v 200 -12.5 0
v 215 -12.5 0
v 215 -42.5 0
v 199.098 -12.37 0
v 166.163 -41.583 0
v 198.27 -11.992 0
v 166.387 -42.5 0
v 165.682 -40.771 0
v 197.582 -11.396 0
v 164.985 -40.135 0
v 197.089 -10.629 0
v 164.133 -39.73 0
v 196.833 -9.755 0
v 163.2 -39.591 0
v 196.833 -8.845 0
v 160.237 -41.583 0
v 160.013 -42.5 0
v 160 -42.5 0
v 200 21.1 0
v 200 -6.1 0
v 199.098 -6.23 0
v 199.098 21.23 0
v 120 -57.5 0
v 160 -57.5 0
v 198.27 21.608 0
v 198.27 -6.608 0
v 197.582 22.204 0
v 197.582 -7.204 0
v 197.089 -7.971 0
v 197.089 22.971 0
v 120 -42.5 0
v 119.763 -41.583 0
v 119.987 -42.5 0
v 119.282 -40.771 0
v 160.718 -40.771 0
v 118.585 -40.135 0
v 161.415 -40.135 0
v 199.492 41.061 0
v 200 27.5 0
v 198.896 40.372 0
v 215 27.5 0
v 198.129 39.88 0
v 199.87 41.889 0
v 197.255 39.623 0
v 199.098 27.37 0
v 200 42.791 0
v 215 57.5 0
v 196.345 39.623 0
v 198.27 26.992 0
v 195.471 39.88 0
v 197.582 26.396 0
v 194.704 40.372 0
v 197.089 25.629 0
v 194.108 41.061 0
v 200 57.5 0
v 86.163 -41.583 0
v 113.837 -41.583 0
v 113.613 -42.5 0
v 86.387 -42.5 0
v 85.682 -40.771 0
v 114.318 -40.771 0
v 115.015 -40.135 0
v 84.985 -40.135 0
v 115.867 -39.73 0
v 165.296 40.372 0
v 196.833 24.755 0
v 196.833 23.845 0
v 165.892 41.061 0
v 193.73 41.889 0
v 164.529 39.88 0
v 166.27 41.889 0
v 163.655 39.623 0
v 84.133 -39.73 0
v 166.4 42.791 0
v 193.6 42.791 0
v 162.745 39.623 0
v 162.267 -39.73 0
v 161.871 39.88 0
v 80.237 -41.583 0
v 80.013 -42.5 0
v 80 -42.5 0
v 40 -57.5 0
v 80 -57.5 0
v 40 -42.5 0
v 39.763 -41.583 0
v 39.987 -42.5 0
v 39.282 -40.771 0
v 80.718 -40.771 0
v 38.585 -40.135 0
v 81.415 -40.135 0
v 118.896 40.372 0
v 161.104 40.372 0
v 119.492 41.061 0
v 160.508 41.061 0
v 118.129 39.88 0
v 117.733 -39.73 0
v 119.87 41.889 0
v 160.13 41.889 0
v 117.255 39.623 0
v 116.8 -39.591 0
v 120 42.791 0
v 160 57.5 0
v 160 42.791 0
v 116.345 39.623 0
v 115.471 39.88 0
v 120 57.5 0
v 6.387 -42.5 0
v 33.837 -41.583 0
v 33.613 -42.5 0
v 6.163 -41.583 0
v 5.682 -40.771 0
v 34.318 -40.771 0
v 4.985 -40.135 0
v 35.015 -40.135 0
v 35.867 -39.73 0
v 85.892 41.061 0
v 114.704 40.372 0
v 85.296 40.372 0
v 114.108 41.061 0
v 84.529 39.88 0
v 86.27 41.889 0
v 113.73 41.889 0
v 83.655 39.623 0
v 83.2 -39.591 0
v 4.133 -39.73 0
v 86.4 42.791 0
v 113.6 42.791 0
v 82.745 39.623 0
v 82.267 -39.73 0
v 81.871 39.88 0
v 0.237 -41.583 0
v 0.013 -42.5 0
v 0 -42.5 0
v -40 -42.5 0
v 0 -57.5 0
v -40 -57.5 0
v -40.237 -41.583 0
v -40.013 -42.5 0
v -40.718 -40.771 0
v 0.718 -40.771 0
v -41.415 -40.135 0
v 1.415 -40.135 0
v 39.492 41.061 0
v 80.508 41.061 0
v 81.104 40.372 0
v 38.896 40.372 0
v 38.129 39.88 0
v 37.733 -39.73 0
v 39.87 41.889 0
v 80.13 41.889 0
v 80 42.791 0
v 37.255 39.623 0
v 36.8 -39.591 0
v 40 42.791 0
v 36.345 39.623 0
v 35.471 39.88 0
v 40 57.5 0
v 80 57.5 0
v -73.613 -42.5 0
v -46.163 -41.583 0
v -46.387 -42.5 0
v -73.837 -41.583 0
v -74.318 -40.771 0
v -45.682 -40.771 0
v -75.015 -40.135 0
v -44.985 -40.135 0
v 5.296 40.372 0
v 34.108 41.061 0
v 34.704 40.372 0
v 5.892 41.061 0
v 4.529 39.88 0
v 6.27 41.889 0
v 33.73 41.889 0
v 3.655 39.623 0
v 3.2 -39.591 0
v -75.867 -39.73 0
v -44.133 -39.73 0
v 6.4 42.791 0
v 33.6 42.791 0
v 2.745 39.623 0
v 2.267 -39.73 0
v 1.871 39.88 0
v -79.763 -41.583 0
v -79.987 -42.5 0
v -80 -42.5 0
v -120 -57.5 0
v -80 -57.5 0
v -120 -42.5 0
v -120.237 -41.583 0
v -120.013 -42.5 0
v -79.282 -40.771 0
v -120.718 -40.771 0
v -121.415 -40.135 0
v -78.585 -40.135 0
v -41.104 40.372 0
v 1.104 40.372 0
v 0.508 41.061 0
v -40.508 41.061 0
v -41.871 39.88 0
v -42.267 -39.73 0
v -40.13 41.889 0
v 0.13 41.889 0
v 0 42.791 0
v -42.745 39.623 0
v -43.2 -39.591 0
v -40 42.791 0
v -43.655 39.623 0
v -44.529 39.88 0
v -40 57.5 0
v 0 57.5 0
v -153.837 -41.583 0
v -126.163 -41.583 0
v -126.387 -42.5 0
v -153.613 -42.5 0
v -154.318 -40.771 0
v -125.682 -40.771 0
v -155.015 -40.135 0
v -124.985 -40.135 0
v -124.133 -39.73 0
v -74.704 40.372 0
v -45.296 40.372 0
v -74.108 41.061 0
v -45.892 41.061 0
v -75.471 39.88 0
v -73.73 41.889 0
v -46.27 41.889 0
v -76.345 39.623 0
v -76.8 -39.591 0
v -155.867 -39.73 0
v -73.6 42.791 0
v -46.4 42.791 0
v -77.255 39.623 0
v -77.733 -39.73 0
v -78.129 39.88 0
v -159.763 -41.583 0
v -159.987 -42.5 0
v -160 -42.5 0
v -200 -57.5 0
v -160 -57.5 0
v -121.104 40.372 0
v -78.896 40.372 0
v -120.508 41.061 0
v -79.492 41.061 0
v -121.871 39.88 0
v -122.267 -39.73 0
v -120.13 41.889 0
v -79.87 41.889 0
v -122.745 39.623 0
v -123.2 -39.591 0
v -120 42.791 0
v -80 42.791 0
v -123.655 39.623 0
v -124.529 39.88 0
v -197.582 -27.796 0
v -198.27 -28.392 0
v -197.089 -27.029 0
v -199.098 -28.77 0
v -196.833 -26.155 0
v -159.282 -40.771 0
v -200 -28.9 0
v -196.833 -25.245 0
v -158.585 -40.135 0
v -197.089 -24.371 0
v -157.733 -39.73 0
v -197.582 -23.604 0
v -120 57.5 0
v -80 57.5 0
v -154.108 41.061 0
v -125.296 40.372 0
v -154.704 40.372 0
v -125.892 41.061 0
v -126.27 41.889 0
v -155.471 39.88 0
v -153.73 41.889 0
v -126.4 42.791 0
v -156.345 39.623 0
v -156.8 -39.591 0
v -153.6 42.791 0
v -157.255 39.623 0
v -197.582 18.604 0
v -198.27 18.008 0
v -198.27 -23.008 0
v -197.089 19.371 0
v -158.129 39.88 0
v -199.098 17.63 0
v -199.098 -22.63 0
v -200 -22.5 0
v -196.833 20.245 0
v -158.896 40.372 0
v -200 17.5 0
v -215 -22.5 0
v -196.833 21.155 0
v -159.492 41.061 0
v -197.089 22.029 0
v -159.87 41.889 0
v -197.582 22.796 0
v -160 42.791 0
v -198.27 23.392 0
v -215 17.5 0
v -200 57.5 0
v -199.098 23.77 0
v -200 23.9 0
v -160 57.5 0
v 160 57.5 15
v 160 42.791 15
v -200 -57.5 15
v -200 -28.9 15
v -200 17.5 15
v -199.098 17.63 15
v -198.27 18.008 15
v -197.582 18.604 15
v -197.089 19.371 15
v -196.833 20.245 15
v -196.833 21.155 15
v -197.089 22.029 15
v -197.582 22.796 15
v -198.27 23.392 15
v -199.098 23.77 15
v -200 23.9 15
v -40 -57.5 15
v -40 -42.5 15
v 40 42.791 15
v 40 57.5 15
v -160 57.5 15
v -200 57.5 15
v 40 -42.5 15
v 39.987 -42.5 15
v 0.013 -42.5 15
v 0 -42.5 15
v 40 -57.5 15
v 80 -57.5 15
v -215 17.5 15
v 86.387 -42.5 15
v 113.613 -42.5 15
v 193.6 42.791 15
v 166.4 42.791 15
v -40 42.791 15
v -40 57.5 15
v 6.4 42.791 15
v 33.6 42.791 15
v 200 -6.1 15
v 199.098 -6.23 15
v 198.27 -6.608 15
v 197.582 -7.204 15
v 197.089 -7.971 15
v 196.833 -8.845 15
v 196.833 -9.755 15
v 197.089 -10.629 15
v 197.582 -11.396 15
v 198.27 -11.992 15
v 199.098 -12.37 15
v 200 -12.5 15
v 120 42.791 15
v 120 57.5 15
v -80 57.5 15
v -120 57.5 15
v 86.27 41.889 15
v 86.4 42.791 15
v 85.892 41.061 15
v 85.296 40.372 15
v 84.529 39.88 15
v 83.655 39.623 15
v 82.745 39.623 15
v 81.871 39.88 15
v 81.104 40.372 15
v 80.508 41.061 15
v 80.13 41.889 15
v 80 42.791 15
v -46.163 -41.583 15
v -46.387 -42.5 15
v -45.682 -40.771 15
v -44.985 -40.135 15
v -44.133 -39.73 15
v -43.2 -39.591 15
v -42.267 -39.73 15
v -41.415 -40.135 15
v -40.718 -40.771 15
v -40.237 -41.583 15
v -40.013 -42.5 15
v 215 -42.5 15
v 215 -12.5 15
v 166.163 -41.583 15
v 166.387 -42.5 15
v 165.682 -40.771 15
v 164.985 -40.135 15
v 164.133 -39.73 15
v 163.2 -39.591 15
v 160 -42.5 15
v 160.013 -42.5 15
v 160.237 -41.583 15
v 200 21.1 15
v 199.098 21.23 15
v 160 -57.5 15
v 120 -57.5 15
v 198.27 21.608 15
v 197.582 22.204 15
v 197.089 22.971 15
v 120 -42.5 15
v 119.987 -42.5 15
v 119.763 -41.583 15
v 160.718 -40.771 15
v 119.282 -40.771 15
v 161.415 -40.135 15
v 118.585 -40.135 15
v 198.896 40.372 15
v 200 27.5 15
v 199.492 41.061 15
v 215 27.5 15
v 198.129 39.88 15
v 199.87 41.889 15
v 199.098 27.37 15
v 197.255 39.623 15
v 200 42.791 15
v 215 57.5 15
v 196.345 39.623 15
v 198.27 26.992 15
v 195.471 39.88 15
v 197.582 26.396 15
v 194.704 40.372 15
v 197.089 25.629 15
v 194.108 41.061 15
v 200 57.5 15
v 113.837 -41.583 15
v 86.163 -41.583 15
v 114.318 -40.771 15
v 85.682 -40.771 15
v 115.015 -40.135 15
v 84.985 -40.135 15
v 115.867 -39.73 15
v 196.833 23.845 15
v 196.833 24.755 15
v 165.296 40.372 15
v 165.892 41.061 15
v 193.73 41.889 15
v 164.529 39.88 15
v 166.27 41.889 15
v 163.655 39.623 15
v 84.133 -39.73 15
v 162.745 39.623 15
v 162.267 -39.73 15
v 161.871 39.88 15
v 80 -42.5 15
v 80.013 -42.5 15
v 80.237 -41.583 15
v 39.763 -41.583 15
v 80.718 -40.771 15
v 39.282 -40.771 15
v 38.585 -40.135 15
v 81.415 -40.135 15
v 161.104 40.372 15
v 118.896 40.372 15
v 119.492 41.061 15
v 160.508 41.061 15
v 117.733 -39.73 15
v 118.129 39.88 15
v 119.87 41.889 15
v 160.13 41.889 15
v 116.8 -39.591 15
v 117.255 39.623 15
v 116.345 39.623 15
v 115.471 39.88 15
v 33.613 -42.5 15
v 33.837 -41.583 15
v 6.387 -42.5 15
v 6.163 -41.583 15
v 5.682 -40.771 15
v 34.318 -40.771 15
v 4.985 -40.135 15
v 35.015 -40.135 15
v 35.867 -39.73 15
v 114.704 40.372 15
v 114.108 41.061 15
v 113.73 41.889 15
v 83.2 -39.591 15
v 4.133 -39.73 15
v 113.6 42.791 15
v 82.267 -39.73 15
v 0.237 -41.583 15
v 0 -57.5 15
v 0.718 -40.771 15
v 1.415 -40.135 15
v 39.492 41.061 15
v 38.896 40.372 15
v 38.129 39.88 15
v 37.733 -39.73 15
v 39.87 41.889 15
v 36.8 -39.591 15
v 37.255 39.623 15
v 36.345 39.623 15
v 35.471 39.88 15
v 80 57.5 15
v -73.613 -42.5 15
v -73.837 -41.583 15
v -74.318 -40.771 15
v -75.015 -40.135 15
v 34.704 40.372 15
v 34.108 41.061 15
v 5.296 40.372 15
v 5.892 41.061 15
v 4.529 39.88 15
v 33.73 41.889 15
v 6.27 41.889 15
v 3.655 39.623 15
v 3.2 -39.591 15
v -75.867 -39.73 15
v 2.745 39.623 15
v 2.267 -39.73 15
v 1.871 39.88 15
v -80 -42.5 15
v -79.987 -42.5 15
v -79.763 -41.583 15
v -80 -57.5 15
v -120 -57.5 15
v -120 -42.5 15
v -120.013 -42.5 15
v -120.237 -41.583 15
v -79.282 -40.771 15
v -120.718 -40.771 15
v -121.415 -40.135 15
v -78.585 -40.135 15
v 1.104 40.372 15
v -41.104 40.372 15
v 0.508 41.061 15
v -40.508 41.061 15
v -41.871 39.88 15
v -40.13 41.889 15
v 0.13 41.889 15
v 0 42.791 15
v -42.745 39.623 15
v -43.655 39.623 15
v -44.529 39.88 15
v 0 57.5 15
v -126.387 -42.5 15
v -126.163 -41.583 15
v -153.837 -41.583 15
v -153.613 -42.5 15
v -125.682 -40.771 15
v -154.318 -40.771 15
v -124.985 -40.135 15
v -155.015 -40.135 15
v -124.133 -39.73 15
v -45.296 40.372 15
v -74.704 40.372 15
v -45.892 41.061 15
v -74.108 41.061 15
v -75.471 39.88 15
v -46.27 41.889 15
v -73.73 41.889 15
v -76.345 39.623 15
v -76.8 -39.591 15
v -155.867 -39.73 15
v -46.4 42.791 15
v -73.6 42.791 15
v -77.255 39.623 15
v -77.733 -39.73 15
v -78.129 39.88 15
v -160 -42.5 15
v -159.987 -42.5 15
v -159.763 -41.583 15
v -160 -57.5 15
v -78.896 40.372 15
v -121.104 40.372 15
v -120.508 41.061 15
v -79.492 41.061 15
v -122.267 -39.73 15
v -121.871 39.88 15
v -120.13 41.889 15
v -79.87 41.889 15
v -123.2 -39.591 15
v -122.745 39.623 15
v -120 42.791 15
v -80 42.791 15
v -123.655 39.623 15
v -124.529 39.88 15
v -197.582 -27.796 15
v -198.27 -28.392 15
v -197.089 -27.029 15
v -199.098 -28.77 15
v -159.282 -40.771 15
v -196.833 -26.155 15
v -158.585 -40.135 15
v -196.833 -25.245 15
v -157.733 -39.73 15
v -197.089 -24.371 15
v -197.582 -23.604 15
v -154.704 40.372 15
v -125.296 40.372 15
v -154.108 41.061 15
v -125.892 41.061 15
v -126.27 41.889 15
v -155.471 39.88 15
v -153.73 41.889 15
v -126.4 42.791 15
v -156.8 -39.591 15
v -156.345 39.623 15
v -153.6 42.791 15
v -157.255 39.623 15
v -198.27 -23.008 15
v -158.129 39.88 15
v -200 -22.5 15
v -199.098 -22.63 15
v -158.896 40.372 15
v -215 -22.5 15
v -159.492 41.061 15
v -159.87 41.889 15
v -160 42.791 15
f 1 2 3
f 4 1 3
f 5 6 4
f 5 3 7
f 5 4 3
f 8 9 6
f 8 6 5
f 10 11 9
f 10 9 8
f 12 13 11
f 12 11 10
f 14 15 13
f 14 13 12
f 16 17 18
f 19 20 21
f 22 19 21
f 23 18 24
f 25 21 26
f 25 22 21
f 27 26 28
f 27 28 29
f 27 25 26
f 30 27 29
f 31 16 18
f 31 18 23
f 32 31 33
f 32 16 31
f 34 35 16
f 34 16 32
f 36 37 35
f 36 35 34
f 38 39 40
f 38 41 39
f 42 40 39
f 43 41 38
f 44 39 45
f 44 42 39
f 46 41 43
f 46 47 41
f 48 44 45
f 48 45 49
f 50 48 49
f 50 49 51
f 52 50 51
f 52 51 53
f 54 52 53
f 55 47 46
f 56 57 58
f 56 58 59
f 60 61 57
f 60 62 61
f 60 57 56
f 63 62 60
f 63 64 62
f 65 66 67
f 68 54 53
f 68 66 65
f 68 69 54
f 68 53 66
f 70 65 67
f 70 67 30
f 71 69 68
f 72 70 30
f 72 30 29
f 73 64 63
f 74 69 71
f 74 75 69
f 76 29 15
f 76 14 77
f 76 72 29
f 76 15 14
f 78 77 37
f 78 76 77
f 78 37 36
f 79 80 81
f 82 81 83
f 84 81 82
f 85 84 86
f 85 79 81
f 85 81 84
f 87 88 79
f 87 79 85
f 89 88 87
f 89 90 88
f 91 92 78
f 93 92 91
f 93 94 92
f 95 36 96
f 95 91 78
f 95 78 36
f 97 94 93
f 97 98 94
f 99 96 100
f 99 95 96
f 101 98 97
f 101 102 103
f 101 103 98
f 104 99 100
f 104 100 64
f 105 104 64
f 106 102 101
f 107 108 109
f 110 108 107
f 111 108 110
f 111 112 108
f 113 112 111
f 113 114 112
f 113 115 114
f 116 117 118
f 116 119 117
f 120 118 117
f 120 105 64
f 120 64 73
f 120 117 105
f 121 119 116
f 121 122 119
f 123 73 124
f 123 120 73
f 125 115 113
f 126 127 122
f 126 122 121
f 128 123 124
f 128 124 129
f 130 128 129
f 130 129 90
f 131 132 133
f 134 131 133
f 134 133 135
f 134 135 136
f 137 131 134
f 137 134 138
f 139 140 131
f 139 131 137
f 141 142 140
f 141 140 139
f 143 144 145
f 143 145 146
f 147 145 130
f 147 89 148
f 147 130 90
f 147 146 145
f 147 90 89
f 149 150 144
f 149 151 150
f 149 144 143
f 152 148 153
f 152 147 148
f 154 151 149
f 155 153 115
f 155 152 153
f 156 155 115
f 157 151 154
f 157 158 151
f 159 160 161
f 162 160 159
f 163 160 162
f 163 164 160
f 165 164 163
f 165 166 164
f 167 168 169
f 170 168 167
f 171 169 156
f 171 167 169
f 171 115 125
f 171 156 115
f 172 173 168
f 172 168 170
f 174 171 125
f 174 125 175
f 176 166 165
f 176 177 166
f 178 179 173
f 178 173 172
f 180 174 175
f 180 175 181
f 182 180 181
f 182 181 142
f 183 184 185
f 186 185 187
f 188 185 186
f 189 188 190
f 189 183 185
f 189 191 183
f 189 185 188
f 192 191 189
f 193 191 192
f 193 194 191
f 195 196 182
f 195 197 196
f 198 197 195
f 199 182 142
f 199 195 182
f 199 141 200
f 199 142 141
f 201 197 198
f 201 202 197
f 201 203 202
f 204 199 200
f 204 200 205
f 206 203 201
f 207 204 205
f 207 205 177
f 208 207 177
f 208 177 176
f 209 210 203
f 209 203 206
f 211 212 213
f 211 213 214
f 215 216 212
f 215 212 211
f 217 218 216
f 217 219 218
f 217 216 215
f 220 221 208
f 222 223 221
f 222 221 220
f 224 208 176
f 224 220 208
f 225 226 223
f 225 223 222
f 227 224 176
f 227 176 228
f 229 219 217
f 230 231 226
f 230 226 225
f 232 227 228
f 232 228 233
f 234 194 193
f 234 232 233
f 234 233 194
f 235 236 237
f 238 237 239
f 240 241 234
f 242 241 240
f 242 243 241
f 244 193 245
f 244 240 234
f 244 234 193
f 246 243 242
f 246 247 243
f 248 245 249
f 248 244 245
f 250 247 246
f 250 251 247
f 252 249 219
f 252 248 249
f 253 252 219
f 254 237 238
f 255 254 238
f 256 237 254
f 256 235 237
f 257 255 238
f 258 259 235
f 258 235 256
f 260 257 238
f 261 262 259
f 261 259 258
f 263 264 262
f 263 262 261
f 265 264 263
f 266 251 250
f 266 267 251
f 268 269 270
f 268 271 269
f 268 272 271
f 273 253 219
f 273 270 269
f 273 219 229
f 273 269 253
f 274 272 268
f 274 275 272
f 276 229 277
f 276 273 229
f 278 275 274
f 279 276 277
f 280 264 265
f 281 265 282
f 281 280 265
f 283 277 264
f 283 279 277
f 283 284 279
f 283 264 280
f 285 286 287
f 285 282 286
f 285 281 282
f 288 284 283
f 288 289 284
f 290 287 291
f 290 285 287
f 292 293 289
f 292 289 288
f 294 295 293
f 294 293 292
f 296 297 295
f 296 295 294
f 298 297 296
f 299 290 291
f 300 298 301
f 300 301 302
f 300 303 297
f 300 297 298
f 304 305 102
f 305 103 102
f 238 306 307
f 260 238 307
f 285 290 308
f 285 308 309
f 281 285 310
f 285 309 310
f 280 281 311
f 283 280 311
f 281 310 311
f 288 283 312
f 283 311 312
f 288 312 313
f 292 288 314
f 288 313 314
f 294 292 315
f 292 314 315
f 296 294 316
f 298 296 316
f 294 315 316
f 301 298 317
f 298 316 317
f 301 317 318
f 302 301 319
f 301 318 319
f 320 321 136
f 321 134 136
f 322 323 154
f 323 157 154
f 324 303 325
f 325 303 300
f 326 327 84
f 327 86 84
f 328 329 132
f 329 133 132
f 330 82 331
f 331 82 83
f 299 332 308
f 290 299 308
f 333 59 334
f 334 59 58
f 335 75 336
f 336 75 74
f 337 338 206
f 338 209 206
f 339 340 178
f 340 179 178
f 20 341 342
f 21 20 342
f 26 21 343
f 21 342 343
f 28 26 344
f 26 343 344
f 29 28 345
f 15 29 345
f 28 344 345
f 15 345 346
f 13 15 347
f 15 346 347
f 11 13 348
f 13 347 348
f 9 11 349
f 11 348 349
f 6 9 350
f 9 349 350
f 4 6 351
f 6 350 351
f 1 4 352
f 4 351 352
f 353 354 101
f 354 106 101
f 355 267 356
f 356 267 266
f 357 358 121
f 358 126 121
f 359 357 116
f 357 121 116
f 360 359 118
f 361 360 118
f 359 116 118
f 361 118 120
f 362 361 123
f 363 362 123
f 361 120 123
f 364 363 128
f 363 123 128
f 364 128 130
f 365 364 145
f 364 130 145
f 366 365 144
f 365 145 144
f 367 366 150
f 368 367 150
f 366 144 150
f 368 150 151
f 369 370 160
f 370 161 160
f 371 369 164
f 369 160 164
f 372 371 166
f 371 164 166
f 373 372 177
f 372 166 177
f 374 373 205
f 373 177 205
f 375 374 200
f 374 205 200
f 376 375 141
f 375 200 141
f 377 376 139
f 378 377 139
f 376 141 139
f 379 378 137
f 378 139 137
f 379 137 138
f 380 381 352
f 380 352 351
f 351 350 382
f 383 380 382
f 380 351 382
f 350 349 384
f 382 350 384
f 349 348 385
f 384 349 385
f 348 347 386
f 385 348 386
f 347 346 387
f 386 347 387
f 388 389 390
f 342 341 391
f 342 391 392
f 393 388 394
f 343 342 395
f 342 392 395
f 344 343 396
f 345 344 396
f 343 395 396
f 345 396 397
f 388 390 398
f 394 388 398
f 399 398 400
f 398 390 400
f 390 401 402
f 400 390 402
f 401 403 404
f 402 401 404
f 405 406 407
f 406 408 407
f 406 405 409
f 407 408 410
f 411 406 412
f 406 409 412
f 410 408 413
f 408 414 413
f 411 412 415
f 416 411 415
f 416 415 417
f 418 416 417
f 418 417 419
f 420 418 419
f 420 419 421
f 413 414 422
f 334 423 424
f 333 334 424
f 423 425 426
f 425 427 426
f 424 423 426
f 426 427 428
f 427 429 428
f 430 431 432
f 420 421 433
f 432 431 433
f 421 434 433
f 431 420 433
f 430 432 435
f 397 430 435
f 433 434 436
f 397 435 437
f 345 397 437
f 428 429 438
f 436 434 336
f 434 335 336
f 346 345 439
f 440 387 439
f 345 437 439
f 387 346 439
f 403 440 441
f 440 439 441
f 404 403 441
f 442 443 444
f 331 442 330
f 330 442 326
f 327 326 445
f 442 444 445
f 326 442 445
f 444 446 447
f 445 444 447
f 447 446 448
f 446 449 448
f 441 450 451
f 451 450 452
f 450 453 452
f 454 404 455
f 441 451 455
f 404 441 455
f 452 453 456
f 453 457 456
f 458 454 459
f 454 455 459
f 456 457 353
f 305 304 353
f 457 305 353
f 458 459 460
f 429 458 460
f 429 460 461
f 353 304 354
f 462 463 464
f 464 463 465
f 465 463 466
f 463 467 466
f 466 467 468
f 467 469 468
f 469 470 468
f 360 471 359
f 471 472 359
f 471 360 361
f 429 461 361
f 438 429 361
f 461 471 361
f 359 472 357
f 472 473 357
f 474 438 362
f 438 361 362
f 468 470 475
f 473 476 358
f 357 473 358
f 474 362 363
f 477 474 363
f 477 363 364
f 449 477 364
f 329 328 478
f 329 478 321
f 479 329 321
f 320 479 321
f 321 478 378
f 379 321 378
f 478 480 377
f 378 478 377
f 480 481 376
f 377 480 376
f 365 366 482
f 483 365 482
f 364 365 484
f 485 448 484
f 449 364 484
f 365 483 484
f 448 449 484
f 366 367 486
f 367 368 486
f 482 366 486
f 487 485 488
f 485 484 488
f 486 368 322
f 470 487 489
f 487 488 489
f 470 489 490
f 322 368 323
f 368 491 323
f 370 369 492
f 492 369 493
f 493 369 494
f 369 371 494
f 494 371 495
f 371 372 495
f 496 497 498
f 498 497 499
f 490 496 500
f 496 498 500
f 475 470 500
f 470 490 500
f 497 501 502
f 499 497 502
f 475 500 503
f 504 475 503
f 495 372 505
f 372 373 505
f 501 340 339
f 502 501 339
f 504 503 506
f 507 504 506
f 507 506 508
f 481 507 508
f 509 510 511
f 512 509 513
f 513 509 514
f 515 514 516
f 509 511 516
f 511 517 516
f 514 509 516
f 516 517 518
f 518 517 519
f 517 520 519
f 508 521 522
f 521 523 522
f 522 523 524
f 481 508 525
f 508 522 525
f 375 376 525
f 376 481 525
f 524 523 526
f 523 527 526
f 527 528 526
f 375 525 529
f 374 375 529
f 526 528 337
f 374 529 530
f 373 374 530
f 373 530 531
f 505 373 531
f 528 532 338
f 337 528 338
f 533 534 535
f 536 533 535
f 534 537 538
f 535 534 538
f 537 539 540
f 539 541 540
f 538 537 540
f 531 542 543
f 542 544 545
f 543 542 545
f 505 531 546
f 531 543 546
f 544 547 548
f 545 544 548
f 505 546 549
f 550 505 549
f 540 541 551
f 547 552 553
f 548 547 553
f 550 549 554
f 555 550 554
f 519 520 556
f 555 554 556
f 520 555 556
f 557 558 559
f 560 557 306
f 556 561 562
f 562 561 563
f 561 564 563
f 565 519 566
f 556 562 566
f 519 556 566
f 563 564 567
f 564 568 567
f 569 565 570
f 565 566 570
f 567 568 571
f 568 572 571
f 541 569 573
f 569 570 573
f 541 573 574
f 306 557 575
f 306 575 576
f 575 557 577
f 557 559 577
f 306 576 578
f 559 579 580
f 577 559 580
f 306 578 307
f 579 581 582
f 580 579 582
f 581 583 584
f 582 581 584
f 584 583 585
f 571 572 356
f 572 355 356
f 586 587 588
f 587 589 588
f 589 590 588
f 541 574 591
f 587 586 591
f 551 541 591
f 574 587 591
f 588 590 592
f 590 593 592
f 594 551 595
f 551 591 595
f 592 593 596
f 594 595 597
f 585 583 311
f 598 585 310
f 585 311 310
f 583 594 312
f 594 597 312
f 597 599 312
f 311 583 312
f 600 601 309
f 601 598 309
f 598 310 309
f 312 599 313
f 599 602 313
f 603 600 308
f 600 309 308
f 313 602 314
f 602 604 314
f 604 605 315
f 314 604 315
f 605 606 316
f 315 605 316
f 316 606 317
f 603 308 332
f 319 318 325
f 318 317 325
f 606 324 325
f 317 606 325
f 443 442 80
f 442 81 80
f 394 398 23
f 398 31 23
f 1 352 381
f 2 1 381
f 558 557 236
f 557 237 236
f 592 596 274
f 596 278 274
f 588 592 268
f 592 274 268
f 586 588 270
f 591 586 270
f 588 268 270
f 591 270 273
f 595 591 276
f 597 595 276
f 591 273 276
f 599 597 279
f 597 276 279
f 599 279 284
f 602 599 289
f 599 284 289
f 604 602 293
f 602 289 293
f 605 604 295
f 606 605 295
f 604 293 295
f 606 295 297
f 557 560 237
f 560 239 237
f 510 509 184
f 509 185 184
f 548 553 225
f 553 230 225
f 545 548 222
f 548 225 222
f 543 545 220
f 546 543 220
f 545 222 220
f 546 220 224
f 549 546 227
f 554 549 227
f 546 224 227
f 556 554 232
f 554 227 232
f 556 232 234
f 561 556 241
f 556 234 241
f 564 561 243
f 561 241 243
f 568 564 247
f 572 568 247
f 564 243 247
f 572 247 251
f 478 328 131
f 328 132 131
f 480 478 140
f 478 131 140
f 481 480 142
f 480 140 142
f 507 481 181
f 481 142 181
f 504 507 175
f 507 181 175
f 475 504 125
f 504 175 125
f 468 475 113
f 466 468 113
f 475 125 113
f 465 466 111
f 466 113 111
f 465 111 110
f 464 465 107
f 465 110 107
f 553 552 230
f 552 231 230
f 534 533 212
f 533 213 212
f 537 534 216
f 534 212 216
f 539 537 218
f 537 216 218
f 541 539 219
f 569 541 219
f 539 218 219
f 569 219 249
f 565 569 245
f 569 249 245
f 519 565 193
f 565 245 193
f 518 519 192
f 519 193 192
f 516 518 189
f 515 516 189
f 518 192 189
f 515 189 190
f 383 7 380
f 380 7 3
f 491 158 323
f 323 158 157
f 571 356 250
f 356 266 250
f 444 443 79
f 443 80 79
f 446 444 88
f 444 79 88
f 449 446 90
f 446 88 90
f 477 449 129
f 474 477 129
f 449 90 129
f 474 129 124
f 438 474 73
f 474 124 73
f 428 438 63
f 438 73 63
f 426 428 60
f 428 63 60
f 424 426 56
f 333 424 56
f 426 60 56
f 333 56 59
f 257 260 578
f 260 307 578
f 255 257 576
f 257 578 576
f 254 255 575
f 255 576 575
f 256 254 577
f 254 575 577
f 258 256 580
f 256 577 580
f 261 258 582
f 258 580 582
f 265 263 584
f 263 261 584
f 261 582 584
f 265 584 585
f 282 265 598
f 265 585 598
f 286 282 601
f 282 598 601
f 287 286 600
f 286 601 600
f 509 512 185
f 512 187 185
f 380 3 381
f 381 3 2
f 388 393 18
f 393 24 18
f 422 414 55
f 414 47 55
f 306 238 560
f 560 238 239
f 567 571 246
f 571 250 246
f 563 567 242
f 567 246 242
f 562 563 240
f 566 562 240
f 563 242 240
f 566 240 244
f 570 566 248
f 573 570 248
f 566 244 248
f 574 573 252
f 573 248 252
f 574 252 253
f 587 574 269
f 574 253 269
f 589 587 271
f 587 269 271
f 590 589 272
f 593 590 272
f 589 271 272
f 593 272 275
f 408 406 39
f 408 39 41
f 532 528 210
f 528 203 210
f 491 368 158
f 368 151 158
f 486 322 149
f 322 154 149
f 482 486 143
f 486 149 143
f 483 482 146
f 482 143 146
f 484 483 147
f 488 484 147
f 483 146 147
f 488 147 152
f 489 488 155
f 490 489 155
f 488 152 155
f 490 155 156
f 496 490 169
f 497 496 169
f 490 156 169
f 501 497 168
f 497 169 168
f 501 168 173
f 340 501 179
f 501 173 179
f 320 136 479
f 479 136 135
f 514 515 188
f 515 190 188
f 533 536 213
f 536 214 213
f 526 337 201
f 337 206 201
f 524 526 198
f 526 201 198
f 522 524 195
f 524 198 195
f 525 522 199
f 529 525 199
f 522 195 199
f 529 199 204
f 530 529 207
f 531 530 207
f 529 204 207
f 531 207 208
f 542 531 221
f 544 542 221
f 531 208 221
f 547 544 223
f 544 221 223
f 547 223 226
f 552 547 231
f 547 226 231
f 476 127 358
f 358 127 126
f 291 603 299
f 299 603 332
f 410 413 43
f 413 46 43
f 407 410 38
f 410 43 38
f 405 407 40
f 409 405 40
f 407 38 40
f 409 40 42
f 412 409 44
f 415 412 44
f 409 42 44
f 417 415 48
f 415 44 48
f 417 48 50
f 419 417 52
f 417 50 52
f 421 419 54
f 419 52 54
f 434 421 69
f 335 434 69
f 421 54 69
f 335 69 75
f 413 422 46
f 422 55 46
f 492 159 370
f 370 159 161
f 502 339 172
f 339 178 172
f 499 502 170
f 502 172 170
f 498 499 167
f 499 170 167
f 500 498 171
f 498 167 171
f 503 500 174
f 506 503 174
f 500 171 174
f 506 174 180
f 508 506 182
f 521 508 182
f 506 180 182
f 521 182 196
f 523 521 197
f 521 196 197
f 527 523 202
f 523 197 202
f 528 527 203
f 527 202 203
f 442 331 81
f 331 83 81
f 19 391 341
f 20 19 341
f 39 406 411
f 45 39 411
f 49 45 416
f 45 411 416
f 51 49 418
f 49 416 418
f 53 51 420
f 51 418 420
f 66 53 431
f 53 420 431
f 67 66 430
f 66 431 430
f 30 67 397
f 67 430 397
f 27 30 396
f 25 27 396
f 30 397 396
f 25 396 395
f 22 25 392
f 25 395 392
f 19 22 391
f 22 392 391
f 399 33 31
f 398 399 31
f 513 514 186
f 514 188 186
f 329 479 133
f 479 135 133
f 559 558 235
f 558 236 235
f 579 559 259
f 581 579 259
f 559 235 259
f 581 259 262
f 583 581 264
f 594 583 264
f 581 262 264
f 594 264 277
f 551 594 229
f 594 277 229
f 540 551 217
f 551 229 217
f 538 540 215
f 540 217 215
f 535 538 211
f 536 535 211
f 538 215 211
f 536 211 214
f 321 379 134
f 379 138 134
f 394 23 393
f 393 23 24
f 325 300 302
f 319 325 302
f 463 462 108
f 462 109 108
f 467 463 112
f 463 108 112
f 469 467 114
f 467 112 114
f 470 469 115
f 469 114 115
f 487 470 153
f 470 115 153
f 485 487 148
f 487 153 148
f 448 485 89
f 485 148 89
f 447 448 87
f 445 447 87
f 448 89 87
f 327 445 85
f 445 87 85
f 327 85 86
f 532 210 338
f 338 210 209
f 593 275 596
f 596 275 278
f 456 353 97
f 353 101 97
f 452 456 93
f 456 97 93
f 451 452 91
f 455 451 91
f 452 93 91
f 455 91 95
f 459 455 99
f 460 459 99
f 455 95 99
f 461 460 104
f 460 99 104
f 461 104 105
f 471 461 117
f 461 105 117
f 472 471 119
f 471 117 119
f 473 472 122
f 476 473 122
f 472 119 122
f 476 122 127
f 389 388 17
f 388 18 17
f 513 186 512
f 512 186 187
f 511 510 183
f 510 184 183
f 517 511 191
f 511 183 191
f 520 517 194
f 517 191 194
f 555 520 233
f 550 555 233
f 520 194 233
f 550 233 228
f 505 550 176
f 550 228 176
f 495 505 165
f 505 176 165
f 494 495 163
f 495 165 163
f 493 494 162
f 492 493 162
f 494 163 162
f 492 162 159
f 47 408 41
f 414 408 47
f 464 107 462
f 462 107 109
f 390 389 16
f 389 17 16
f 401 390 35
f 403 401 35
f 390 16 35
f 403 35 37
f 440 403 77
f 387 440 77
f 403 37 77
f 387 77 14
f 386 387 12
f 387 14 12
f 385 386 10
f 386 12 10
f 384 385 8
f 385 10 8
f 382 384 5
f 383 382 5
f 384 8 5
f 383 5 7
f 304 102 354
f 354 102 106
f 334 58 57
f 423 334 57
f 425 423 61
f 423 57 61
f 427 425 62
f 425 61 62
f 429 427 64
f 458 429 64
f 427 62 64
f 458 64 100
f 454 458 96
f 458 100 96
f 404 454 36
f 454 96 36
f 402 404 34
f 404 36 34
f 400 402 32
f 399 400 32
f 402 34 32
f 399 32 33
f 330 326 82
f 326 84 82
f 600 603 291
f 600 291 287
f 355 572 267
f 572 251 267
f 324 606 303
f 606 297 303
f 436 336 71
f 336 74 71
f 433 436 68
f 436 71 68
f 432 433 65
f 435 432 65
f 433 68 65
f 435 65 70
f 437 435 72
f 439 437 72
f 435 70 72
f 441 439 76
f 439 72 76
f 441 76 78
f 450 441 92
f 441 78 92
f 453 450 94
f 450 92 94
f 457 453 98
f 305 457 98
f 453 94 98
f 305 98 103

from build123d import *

# Parameters (mm, degrees)
SALIENTE_EXTRUIR2_DEPTH = 10
SALIENTE_EXTRUIR3_DEPTH = 5
CROQUIS4_W              = 15
CROQUIS4_H              = 40
CORTAR_EXTRUIR1_DEPTH   = 15
CROQUIS5_W              = 15
CROQUIS5_H              = 40
SALIENTE_EXTRUIR4_DEPTH = 15
SALIENTE_EXTRUIR5_DEPTH = 15
CROQUIS7_R              = 3.2
CORTAR_EXTRUIR2_DEPTH   = 15
CROQUIS8_W              = 15
CROQUIS8_H              = 30
SALIENTE_EXTRUIR6_DEPTH = 15
CROQUIS9_W              = 15
CROQUIS9_H              = 40
CORTAR_EXTRUIR3_DEPTH   = 15
SALIENTE_EXTRUIR8_DEPTH = 15
CROQUIS12_R             = 3.2
CORTAR_EXTRUIR4_DEPTH   = 15


with BuildPart() as part:
    # Croquis1 → Saliente-Extruir2 (new body)
    with BuildSketch(Plane.XY):
        with BuildLine():
            Line((-200, -42.5), (-200, -57.5))
            Line((-200, -57.5), (-160, -57.5))
            Line((-160, -57.5), (-160, -49.312229152))
            Line((-160, -49.312229152), (-160, -42.790697674))
            Line((-160, -42.790697674), (-160, -42.5))
            Line((-160, -42.5), (-159.986768718, -42.5))
            ThreePointArc((-159.986768718, -42.5), (-156.8, -39.590697674), (-153.613231282, -42.5))
            Line((-153.613231282, -42.5), (-126.386768718, -42.5))
            ThreePointArc((-126.386768718, -42.5), (-123.2, -39.590697674), (-120.013231282, -42.5))
            Line((-120.013231282, -42.5), (-120, -42.5))
            Line((-120, -42.5), (-120, -42.790697674))
            Line((-120, -42.790697674), (-120, -57.5))
            Line((-120, -57.5), (-80, -57.5))
            Line((-80, -57.5), (-80, -42.790697674))
            Line((-80, -42.790697674), (-80, -42.5))
            Line((-80, -42.5), (-79.986768718, -42.5))
            ThreePointArc((-79.986768718, -42.5), (-76.8, -39.590697674), (-73.613231282, -42.5))
            Line((-73.613231282, -42.5), (-46.386768718, -42.5))
            ThreePointArc((-46.386768718, -42.5), (-43.2, -39.590697674), (-40.013231282, -42.5))
            Line((-40.013231282, -42.5), (-40, -42.5))
            Line((-40, -42.5), (-40, -42.790697674))
            Line((-40, -42.790697674), (-40, -57.5))
            Line((-40, -57.5), (0, -57.5))
            Line((0, -57.5), (0, -42.790697674))
            Line((0, -42.790697674), (0, -42.5))
            Line((0, -42.5), (0.013231282, -42.5))
            ThreePointArc((0.013231282, -42.5), (3.2, -39.590697674), (6.386768718, -42.5))
            Line((6.386768718, -42.5), (33.613231282, -42.5))
            ThreePointArc((33.613231282, -42.5), (36.8, -39.590697674), (39.986768718, -42.5))
            Line((39.986768718, -42.5), (40, -42.5))
            Line((40, -42.5), (40, -42.790697674))
            Line((40, -42.790697674), (40, -57.5))
            Line((40, -57.5), (80, -57.5))
            Line((80, -57.5), (80, -42.790697674))
            Line((80, -42.790697674), (80, -42.5))
            Line((80, -42.5), (80.013231282, -42.5))
            ThreePointArc((80.013231282, -42.5), (83.2, -39.590697674), (86.386768718, -42.5))
            Line((86.386768718, -42.5), (113.613231282, -42.5))
            ThreePointArc((113.613231282, -42.5), (116.8, -39.590697674), (119.986768718, -42.5))
            Line((119.986768718, -42.5), (120, -42.5))
            Line((120, -42.5), (120, -42.790697674))
            Line((120, -42.790697674), (120, -57.5))
            Line((120, -57.5), (160, -57.5))
            Line((160, -57.5), (160, -42.790697674))
            Line((160, -42.790697674), (160, -42.5))
            Line((160, -42.5), (160.013231282, -42.5))
            ThreePointArc((160.013231282, -42.5), (163.2, -39.590697674), (166.386768718, -42.5))
            Line((166.386768718, -42.5), (200, -42.5))
            Line((200, -42.5), (215, -42.5))
            Line((215, -42.5), (215, -12.209302326))
            Line((215, -12.209302326), (200, -12.209302326))
            ThreePointArc((200, -12.209302326), (196.8, -9.009302326), (200, -5.809302326))
            Line((200, -5.809302326), (200, 7.790697674))
            Line((200, 7.790697674), (200, 21.390697674))
            ThreePointArc((200, 21.390697674), (196.8, 24.590697674), (200, 27.790697674))
            Line((200, 27.790697674), (215, 27.790697674))
            Line((215, 27.790697674), (215, 57.5))
            Line((215, 57.5), (200, 57.5))
            Line((200, 57.5), (200, 42.790697674))
            ThreePointArc((200, 42.790697674), (196.8, 39.590697674), (193.6, 42.790697674))
            Line((193.6, 42.790697674), (166.4, 42.790697674))
            ThreePointArc((166.4, 42.790697674), (163.2, 39.590697674), (160, 42.790697674))
            Line((160, 42.790697674), (160, 57.5))
            Line((160, 57.5), (140, 57.5))
            Line((140, 57.5), (120, 57.5))
            Line((120, 57.5), (120, 42.790697674))
            ThreePointArc((120, 42.790697674), (116.8, 39.590697674), (113.6, 42.790697674))
            Line((113.6, 42.790697674), (86.4, 42.790697674))
            ThreePointArc((86.4, 42.790697674), (83.2, 39.590697674), (80, 42.790697674))
            Line((80, 42.790697674), (80, 57.5))
            Line((80, 57.5), (40, 57.5))
            Line((40, 57.5), (40, 42.790697674))
            ThreePointArc((40, 42.790697674), (36.8, 39.590697674), (33.6, 42.790697674))
            Line((33.6, 42.790697674), (6.4, 42.790697674))
            ThreePointArc((6.4, 42.790697674), (3.2, 39.590697674), (0, 42.790697674))
            Line((0, 42.790697674), (0, 57.5))
            Line((0, 57.5), (-20, 57.5))
            Line((-20, 57.5), (-40, 57.5))
            Line((-40, 57.5), (-40, 42.790697674))
            ThreePointArc((-40, 42.790697674), (-43.2, 39.590697674), (-46.4, 42.790697674))
            Line((-46.4, 42.790697674), (-73.6, 42.790697674))
            ThreePointArc((-73.6, 42.790697674), (-76.8, 39.590697674), (-80, 42.790697674))
            Line((-80, 42.790697674), (-80, 57.5))
            Line((-80, 57.5), (-100, 57.5))
            Line((-100, 57.5), (-120, 57.5))
            Line((-120, 57.5), (-120, 42.790697674))
            ThreePointArc((-120, 42.790697674), (-123.2, 39.590697674), (-126.4, 42.790697674))
            Line((-126.4, 42.790697674), (-140, 42.790697674))
            Line((-140, 42.790697674), (-153.6, 42.790697674))
            ThreePointArc((-153.6, 42.790697674), (-156.8, 39.590697674), (-160, 42.790697674))
            Line((-160, 42.790697674), (-160, 57.5))
            Line((-160, 57.5), (-200, 57.5))
            Line((-200, 57.5), (-200, 42.790697674))
            Line((-200, 42.790697674), (-200, 26.4))
            ThreePointArc((-200, 26.4), (-196.8, 23.2), (-200, 20))
            Line((-200, 20), (-215, 20))
            Line((-215, 20), (-215, 0))
            Line((-215, 0), (-215, -20))
            Line((-215, -20), (-200, -20))
            ThreePointArc((-200, -20), (-196.8, -23.2), (-200, -26.4))
            Line((-200, -26.4), (-200, -42.5))
        make_face()
    extrude(amount=SALIENTE_EXTRUIR2_DEPTH)

    # Croquis3 → Saliente-Extruir3 (add)
    with BuildSketch(Plane.XY.offset(10)):
        with BuildLine():
            Line((119.986768718, -42.5), (120, -42.5))
            Line((120, -42.5), (120, -57.5))
            Line((120, -57.5), (160, -57.5))
            Line((160, -57.5), (160, -42.5))
            Line((160, -42.5), (160.013231282, -42.5))
            ThreePointArc((160.013231282, -42.5), (163.2, -39.590697674), (166.386768718, -42.5))
            Line((166.386768718, -42.5), (215, -42.5))
            Line((215, -42.5), (215, -12.209302326))
            Line((215, -12.209302326), (200, -12.209302326))
            ThreePointArc((200, -12.209302326), (196.8, -9.009302326), (200, -5.809302326))
            Line((200, -5.809302326), (200, 21.390697674))
            ThreePointArc((200, 21.390697674), (196.8, 24.590697674), (200, 27.790697674))
            Line((200, 27.790697674), (215, 27.790697674))
            Line((215, 27.790697674), (215, 57.5))
            Line((215, 57.5), (200, 57.5))
            Line((200, 57.5), (200, 42.790697674))
            ThreePointArc((200, 42.790697674), (196.8, 39.590697674), (193.6, 42.790697674))
            Line((193.6, 42.790697674), (166.4, 42.790697674))
            ThreePointArc((166.4, 42.790697674), (163.2, 39.590697674), (160, 42.790697674))
            Line((160, 42.790697674), (160, 57.5))
            Line((160, 57.5), (120, 57.5))
            Line((120, 57.5), (120, 42.790697674))
            ThreePointArc((120, 42.790697674), (116.8, 39.590697674), (113.6, 42.790697674))
            Line((113.6, 42.790697674), (86.4, 42.790697674))
            ThreePointArc((86.4, 42.790697674), (83.2, 39.590697674), (80, 42.790697674))
            Line((80, 42.790697674), (80, 57.5))
            Line((80, 57.5), (40, 57.5))
            Line((40, 57.5), (40, 42.790697674))
            ThreePointArc((40, 42.790697674), (36.8, 39.590697674), (33.6, 42.790697674))
            Line((33.6, 42.790697674), (6.4, 42.790697674))
            ThreePointArc((6.4, 42.790697674), (3.2, 39.590697674), (0, 42.790697674))
            Line((0, 42.790697674), (0, 57.5))
            Line((0, 57.5), (-40, 57.5))
            Line((-40, 57.5), (-40, 42.790697674))
            ThreePointArc((-40, 42.790697674), (-43.2, 39.590697674), (-46.4, 42.790697674))
            Line((-46.4, 42.790697674), (-73.6, 42.790697674))
            ThreePointArc((-73.6, 42.790697674), (-76.8, 39.590697674), (-80, 42.790697674))
            Line((-80, 42.790697674), (-80, 57.5))
            Line((-80, 57.5), (-120, 57.5))
            Line((-120, 57.5), (-120, 42.790697674))
            ThreePointArc((-120, 42.790697674), (-123.2, 39.590697674), (-126.4, 42.790697674))
            Line((-126.4, 42.790697674), (-153.6, 42.790697674))
            ThreePointArc((-153.6, 42.790697674), (-156.8, 39.590697674), (-160, 42.790697674))
            Line((-160, 42.790697674), (-160, 57.5))
            Line((-160, 57.5), (-200, 57.5))
            Line((-200, 57.5), (-200, 26.4))
            ThreePointArc((-200, 26.4), (-196.8, 23.2), (-200, 20))
            Line((-200, 20), (-215, 20))
            Line((-215, 20), (-215, -20))
            Line((-215, -20), (-200, -20))
            ThreePointArc((-200, -20), (-196.8, -23.2), (-200, -26.4))
            Line((-200, -26.4), (-200, -57.5))
            Line((-200, -57.5), (-160, -57.5))
            Line((-160, -57.5), (-160, -42.5))
            Line((-160, -42.5), (-159.986768718, -42.5))
            ThreePointArc((-159.986768718, -42.5), (-156.8, -39.590697674), (-153.613231282, -42.5))
            Line((-153.613231282, -42.5), (-126.386768718, -42.5))
            ThreePointArc((-126.386768718, -42.5), (-123.2, -39.590697674), (-120.013231282, -42.5))
            Line((-120.013231282, -42.5), (-120, -42.5))
            Line((-120, -42.5), (-120, -57.5))
            Line((-120, -57.5), (-80, -57.5))
            Line((-80, -57.5), (-80, -42.5))
            Line((-80, -42.5), (-79.986768718, -42.5))
            ThreePointArc((-79.986768718, -42.5), (-76.8, -39.590697674), (-73.613231282, -42.5))
            Line((-73.613231282, -42.5), (-46.386768718, -42.5))
            ThreePointArc((-46.386768718, -42.5), (-43.2, -39.590697674), (-40.013231282, -42.5))
            Line((-40.013231282, -42.5), (-40, -42.5))
            Line((-40, -42.5), (-40, -57.5))
            Line((-40, -57.5), (0, -57.5))
            Line((0, -57.5), (0, -42.5))
            Line((0, -42.5), (0.013231282, -42.5))
            ThreePointArc((0.013231282, -42.5), (3.2, -39.590697674), (6.386768718, -42.5))
            Line((6.386768718, -42.5), (33.613231282, -42.5))
            ThreePointArc((33.613231282, -42.5), (36.8, -39.590697674), (39.986768718, -42.5))
            Line((39.986768718, -42.5), (40, -42.5))
            Line((40, -42.5), (40, -57.5))
            Line((40, -57.5), (80, -57.5))
            Line((80, -57.5), (80, -42.5))
            Line((80, -42.5), (80.013231282, -42.5))
            ThreePointArc((80.013231282, -42.5), (83.2, -39.590697674), (86.386768718, -42.5))
            Line((86.386768718, -42.5), (113.613231282, -42.5))
            ThreePointArc((113.613231282, -42.5), (116.8, -39.590697674), (119.986768718, -42.5))
        make_face()
    extrude(amount=SALIENTE_EXTRUIR3_DEPTH)

    # Croquis4 → Cortar-Extruir1 (cut)
    with BuildSketch(Plane.XY.offset(15)):
        with Locations((-207.5, 37.5)):
            Rectangle(CROQUIS4_W, CROQUIS4_H)
    extrude(amount=-CORTAR_EXTRUIR1_DEPTH, mode=Mode.SUBTRACT)

    # Croquis5 → Saliente-Extruir4 (add)
    with BuildSketch(Plane.XY.offset(15)):
        with Locations((-207.5, -2.5)):
            Rectangle(CROQUIS5_W, CROQUIS5_H)
    extrude(amount=-SALIENTE_EXTRUIR4_DEPTH)

    # Croquis6 → Saliente-Extruir5 (add)
    with BuildSketch(Plane.XY.offset(15)):
        with BuildLine():
            Line((-200, -22.5), (-200, -20))
            ThreePointArc((-200, -20), (-196.8, -23.2), (-200, -26.4))
            Line((-200, -26.4), (-200, -22.5))
        make_face()
        with BuildLine():
            Line((-200, 20), (-200, 26.4))
            ThreePointArc((-200, 26.4), (-196.8, 23.2), (-200, 20))
        make_face()
    extrude(amount=-SALIENTE_EXTRUIR5_DEPTH)

    # Croquis7 → Cortar-Extruir2 (cut)
    with BuildSketch(Plane.XY.offset(15)):
        with Locations((-200, 20.7)):
            Circle(CROQUIS7_R)
        with Locations((-200, -25.7)):
            Circle(CROQUIS7_R)
    extrude(amount=-CORTAR_EXTRUIR2_DEPTH, mode=Mode.SUBTRACT)

    # Croquis8 → Saliente-Extruir6 (add)
    with BuildSketch(Plane.XY.offset(15)):
        with Locations((207.5, 42.5)):
            Rectangle(CROQUIS8_W, CROQUIS8_H)
    extrude(amount=-SALIENTE_EXTRUIR6_DEPTH)

    # Croquis9 → Cortar-Extruir3 (cut)
    with BuildSketch(Plane.XY.offset(15)):
        with Locations((207.5, 7.5)):
            Rectangle(CROQUIS9_W, CROQUIS9_H)
    extrude(amount=-CORTAR_EXTRUIR3_DEPTH, mode=Mode.SUBTRACT)

    # Croquis10 → Saliente-Extruir8 (add)
    with BuildSketch(Plane.XY.offset(15)):
        with BuildLine():
            Line((200, -5.809302326), (200, -12.209302326))
            ThreePointArc((200, -12.209302326), (196.8, -9.009302326), (200, -5.809302326))
        make_face()
        with BuildLine():
            Line((200, 27.5), (200, 21.390697674))
            ThreePointArc((200, 21.390697674), (196.8, 24.590697674), (200, 27.790697674))
            Line((200, 27.790697674), (200, 27.5))
        make_face()
    extrude(amount=-SALIENTE_EXTRUIR8_DEPTH)

    # Croquis12 → Cortar-Extruir4 (cut)
    with BuildSketch(Plane.XY.offset(15)):
        with Locations((200, 24.3)):
            Circle(CROQUIS12_R)
        with Locations((200, -9.3)):
            Circle(CROQUIS12_R)
    extrude(amount=-CORTAR_EXTRUIR4_DEPTH, mode=Mode.SUBTRACT)


solid = part.part
